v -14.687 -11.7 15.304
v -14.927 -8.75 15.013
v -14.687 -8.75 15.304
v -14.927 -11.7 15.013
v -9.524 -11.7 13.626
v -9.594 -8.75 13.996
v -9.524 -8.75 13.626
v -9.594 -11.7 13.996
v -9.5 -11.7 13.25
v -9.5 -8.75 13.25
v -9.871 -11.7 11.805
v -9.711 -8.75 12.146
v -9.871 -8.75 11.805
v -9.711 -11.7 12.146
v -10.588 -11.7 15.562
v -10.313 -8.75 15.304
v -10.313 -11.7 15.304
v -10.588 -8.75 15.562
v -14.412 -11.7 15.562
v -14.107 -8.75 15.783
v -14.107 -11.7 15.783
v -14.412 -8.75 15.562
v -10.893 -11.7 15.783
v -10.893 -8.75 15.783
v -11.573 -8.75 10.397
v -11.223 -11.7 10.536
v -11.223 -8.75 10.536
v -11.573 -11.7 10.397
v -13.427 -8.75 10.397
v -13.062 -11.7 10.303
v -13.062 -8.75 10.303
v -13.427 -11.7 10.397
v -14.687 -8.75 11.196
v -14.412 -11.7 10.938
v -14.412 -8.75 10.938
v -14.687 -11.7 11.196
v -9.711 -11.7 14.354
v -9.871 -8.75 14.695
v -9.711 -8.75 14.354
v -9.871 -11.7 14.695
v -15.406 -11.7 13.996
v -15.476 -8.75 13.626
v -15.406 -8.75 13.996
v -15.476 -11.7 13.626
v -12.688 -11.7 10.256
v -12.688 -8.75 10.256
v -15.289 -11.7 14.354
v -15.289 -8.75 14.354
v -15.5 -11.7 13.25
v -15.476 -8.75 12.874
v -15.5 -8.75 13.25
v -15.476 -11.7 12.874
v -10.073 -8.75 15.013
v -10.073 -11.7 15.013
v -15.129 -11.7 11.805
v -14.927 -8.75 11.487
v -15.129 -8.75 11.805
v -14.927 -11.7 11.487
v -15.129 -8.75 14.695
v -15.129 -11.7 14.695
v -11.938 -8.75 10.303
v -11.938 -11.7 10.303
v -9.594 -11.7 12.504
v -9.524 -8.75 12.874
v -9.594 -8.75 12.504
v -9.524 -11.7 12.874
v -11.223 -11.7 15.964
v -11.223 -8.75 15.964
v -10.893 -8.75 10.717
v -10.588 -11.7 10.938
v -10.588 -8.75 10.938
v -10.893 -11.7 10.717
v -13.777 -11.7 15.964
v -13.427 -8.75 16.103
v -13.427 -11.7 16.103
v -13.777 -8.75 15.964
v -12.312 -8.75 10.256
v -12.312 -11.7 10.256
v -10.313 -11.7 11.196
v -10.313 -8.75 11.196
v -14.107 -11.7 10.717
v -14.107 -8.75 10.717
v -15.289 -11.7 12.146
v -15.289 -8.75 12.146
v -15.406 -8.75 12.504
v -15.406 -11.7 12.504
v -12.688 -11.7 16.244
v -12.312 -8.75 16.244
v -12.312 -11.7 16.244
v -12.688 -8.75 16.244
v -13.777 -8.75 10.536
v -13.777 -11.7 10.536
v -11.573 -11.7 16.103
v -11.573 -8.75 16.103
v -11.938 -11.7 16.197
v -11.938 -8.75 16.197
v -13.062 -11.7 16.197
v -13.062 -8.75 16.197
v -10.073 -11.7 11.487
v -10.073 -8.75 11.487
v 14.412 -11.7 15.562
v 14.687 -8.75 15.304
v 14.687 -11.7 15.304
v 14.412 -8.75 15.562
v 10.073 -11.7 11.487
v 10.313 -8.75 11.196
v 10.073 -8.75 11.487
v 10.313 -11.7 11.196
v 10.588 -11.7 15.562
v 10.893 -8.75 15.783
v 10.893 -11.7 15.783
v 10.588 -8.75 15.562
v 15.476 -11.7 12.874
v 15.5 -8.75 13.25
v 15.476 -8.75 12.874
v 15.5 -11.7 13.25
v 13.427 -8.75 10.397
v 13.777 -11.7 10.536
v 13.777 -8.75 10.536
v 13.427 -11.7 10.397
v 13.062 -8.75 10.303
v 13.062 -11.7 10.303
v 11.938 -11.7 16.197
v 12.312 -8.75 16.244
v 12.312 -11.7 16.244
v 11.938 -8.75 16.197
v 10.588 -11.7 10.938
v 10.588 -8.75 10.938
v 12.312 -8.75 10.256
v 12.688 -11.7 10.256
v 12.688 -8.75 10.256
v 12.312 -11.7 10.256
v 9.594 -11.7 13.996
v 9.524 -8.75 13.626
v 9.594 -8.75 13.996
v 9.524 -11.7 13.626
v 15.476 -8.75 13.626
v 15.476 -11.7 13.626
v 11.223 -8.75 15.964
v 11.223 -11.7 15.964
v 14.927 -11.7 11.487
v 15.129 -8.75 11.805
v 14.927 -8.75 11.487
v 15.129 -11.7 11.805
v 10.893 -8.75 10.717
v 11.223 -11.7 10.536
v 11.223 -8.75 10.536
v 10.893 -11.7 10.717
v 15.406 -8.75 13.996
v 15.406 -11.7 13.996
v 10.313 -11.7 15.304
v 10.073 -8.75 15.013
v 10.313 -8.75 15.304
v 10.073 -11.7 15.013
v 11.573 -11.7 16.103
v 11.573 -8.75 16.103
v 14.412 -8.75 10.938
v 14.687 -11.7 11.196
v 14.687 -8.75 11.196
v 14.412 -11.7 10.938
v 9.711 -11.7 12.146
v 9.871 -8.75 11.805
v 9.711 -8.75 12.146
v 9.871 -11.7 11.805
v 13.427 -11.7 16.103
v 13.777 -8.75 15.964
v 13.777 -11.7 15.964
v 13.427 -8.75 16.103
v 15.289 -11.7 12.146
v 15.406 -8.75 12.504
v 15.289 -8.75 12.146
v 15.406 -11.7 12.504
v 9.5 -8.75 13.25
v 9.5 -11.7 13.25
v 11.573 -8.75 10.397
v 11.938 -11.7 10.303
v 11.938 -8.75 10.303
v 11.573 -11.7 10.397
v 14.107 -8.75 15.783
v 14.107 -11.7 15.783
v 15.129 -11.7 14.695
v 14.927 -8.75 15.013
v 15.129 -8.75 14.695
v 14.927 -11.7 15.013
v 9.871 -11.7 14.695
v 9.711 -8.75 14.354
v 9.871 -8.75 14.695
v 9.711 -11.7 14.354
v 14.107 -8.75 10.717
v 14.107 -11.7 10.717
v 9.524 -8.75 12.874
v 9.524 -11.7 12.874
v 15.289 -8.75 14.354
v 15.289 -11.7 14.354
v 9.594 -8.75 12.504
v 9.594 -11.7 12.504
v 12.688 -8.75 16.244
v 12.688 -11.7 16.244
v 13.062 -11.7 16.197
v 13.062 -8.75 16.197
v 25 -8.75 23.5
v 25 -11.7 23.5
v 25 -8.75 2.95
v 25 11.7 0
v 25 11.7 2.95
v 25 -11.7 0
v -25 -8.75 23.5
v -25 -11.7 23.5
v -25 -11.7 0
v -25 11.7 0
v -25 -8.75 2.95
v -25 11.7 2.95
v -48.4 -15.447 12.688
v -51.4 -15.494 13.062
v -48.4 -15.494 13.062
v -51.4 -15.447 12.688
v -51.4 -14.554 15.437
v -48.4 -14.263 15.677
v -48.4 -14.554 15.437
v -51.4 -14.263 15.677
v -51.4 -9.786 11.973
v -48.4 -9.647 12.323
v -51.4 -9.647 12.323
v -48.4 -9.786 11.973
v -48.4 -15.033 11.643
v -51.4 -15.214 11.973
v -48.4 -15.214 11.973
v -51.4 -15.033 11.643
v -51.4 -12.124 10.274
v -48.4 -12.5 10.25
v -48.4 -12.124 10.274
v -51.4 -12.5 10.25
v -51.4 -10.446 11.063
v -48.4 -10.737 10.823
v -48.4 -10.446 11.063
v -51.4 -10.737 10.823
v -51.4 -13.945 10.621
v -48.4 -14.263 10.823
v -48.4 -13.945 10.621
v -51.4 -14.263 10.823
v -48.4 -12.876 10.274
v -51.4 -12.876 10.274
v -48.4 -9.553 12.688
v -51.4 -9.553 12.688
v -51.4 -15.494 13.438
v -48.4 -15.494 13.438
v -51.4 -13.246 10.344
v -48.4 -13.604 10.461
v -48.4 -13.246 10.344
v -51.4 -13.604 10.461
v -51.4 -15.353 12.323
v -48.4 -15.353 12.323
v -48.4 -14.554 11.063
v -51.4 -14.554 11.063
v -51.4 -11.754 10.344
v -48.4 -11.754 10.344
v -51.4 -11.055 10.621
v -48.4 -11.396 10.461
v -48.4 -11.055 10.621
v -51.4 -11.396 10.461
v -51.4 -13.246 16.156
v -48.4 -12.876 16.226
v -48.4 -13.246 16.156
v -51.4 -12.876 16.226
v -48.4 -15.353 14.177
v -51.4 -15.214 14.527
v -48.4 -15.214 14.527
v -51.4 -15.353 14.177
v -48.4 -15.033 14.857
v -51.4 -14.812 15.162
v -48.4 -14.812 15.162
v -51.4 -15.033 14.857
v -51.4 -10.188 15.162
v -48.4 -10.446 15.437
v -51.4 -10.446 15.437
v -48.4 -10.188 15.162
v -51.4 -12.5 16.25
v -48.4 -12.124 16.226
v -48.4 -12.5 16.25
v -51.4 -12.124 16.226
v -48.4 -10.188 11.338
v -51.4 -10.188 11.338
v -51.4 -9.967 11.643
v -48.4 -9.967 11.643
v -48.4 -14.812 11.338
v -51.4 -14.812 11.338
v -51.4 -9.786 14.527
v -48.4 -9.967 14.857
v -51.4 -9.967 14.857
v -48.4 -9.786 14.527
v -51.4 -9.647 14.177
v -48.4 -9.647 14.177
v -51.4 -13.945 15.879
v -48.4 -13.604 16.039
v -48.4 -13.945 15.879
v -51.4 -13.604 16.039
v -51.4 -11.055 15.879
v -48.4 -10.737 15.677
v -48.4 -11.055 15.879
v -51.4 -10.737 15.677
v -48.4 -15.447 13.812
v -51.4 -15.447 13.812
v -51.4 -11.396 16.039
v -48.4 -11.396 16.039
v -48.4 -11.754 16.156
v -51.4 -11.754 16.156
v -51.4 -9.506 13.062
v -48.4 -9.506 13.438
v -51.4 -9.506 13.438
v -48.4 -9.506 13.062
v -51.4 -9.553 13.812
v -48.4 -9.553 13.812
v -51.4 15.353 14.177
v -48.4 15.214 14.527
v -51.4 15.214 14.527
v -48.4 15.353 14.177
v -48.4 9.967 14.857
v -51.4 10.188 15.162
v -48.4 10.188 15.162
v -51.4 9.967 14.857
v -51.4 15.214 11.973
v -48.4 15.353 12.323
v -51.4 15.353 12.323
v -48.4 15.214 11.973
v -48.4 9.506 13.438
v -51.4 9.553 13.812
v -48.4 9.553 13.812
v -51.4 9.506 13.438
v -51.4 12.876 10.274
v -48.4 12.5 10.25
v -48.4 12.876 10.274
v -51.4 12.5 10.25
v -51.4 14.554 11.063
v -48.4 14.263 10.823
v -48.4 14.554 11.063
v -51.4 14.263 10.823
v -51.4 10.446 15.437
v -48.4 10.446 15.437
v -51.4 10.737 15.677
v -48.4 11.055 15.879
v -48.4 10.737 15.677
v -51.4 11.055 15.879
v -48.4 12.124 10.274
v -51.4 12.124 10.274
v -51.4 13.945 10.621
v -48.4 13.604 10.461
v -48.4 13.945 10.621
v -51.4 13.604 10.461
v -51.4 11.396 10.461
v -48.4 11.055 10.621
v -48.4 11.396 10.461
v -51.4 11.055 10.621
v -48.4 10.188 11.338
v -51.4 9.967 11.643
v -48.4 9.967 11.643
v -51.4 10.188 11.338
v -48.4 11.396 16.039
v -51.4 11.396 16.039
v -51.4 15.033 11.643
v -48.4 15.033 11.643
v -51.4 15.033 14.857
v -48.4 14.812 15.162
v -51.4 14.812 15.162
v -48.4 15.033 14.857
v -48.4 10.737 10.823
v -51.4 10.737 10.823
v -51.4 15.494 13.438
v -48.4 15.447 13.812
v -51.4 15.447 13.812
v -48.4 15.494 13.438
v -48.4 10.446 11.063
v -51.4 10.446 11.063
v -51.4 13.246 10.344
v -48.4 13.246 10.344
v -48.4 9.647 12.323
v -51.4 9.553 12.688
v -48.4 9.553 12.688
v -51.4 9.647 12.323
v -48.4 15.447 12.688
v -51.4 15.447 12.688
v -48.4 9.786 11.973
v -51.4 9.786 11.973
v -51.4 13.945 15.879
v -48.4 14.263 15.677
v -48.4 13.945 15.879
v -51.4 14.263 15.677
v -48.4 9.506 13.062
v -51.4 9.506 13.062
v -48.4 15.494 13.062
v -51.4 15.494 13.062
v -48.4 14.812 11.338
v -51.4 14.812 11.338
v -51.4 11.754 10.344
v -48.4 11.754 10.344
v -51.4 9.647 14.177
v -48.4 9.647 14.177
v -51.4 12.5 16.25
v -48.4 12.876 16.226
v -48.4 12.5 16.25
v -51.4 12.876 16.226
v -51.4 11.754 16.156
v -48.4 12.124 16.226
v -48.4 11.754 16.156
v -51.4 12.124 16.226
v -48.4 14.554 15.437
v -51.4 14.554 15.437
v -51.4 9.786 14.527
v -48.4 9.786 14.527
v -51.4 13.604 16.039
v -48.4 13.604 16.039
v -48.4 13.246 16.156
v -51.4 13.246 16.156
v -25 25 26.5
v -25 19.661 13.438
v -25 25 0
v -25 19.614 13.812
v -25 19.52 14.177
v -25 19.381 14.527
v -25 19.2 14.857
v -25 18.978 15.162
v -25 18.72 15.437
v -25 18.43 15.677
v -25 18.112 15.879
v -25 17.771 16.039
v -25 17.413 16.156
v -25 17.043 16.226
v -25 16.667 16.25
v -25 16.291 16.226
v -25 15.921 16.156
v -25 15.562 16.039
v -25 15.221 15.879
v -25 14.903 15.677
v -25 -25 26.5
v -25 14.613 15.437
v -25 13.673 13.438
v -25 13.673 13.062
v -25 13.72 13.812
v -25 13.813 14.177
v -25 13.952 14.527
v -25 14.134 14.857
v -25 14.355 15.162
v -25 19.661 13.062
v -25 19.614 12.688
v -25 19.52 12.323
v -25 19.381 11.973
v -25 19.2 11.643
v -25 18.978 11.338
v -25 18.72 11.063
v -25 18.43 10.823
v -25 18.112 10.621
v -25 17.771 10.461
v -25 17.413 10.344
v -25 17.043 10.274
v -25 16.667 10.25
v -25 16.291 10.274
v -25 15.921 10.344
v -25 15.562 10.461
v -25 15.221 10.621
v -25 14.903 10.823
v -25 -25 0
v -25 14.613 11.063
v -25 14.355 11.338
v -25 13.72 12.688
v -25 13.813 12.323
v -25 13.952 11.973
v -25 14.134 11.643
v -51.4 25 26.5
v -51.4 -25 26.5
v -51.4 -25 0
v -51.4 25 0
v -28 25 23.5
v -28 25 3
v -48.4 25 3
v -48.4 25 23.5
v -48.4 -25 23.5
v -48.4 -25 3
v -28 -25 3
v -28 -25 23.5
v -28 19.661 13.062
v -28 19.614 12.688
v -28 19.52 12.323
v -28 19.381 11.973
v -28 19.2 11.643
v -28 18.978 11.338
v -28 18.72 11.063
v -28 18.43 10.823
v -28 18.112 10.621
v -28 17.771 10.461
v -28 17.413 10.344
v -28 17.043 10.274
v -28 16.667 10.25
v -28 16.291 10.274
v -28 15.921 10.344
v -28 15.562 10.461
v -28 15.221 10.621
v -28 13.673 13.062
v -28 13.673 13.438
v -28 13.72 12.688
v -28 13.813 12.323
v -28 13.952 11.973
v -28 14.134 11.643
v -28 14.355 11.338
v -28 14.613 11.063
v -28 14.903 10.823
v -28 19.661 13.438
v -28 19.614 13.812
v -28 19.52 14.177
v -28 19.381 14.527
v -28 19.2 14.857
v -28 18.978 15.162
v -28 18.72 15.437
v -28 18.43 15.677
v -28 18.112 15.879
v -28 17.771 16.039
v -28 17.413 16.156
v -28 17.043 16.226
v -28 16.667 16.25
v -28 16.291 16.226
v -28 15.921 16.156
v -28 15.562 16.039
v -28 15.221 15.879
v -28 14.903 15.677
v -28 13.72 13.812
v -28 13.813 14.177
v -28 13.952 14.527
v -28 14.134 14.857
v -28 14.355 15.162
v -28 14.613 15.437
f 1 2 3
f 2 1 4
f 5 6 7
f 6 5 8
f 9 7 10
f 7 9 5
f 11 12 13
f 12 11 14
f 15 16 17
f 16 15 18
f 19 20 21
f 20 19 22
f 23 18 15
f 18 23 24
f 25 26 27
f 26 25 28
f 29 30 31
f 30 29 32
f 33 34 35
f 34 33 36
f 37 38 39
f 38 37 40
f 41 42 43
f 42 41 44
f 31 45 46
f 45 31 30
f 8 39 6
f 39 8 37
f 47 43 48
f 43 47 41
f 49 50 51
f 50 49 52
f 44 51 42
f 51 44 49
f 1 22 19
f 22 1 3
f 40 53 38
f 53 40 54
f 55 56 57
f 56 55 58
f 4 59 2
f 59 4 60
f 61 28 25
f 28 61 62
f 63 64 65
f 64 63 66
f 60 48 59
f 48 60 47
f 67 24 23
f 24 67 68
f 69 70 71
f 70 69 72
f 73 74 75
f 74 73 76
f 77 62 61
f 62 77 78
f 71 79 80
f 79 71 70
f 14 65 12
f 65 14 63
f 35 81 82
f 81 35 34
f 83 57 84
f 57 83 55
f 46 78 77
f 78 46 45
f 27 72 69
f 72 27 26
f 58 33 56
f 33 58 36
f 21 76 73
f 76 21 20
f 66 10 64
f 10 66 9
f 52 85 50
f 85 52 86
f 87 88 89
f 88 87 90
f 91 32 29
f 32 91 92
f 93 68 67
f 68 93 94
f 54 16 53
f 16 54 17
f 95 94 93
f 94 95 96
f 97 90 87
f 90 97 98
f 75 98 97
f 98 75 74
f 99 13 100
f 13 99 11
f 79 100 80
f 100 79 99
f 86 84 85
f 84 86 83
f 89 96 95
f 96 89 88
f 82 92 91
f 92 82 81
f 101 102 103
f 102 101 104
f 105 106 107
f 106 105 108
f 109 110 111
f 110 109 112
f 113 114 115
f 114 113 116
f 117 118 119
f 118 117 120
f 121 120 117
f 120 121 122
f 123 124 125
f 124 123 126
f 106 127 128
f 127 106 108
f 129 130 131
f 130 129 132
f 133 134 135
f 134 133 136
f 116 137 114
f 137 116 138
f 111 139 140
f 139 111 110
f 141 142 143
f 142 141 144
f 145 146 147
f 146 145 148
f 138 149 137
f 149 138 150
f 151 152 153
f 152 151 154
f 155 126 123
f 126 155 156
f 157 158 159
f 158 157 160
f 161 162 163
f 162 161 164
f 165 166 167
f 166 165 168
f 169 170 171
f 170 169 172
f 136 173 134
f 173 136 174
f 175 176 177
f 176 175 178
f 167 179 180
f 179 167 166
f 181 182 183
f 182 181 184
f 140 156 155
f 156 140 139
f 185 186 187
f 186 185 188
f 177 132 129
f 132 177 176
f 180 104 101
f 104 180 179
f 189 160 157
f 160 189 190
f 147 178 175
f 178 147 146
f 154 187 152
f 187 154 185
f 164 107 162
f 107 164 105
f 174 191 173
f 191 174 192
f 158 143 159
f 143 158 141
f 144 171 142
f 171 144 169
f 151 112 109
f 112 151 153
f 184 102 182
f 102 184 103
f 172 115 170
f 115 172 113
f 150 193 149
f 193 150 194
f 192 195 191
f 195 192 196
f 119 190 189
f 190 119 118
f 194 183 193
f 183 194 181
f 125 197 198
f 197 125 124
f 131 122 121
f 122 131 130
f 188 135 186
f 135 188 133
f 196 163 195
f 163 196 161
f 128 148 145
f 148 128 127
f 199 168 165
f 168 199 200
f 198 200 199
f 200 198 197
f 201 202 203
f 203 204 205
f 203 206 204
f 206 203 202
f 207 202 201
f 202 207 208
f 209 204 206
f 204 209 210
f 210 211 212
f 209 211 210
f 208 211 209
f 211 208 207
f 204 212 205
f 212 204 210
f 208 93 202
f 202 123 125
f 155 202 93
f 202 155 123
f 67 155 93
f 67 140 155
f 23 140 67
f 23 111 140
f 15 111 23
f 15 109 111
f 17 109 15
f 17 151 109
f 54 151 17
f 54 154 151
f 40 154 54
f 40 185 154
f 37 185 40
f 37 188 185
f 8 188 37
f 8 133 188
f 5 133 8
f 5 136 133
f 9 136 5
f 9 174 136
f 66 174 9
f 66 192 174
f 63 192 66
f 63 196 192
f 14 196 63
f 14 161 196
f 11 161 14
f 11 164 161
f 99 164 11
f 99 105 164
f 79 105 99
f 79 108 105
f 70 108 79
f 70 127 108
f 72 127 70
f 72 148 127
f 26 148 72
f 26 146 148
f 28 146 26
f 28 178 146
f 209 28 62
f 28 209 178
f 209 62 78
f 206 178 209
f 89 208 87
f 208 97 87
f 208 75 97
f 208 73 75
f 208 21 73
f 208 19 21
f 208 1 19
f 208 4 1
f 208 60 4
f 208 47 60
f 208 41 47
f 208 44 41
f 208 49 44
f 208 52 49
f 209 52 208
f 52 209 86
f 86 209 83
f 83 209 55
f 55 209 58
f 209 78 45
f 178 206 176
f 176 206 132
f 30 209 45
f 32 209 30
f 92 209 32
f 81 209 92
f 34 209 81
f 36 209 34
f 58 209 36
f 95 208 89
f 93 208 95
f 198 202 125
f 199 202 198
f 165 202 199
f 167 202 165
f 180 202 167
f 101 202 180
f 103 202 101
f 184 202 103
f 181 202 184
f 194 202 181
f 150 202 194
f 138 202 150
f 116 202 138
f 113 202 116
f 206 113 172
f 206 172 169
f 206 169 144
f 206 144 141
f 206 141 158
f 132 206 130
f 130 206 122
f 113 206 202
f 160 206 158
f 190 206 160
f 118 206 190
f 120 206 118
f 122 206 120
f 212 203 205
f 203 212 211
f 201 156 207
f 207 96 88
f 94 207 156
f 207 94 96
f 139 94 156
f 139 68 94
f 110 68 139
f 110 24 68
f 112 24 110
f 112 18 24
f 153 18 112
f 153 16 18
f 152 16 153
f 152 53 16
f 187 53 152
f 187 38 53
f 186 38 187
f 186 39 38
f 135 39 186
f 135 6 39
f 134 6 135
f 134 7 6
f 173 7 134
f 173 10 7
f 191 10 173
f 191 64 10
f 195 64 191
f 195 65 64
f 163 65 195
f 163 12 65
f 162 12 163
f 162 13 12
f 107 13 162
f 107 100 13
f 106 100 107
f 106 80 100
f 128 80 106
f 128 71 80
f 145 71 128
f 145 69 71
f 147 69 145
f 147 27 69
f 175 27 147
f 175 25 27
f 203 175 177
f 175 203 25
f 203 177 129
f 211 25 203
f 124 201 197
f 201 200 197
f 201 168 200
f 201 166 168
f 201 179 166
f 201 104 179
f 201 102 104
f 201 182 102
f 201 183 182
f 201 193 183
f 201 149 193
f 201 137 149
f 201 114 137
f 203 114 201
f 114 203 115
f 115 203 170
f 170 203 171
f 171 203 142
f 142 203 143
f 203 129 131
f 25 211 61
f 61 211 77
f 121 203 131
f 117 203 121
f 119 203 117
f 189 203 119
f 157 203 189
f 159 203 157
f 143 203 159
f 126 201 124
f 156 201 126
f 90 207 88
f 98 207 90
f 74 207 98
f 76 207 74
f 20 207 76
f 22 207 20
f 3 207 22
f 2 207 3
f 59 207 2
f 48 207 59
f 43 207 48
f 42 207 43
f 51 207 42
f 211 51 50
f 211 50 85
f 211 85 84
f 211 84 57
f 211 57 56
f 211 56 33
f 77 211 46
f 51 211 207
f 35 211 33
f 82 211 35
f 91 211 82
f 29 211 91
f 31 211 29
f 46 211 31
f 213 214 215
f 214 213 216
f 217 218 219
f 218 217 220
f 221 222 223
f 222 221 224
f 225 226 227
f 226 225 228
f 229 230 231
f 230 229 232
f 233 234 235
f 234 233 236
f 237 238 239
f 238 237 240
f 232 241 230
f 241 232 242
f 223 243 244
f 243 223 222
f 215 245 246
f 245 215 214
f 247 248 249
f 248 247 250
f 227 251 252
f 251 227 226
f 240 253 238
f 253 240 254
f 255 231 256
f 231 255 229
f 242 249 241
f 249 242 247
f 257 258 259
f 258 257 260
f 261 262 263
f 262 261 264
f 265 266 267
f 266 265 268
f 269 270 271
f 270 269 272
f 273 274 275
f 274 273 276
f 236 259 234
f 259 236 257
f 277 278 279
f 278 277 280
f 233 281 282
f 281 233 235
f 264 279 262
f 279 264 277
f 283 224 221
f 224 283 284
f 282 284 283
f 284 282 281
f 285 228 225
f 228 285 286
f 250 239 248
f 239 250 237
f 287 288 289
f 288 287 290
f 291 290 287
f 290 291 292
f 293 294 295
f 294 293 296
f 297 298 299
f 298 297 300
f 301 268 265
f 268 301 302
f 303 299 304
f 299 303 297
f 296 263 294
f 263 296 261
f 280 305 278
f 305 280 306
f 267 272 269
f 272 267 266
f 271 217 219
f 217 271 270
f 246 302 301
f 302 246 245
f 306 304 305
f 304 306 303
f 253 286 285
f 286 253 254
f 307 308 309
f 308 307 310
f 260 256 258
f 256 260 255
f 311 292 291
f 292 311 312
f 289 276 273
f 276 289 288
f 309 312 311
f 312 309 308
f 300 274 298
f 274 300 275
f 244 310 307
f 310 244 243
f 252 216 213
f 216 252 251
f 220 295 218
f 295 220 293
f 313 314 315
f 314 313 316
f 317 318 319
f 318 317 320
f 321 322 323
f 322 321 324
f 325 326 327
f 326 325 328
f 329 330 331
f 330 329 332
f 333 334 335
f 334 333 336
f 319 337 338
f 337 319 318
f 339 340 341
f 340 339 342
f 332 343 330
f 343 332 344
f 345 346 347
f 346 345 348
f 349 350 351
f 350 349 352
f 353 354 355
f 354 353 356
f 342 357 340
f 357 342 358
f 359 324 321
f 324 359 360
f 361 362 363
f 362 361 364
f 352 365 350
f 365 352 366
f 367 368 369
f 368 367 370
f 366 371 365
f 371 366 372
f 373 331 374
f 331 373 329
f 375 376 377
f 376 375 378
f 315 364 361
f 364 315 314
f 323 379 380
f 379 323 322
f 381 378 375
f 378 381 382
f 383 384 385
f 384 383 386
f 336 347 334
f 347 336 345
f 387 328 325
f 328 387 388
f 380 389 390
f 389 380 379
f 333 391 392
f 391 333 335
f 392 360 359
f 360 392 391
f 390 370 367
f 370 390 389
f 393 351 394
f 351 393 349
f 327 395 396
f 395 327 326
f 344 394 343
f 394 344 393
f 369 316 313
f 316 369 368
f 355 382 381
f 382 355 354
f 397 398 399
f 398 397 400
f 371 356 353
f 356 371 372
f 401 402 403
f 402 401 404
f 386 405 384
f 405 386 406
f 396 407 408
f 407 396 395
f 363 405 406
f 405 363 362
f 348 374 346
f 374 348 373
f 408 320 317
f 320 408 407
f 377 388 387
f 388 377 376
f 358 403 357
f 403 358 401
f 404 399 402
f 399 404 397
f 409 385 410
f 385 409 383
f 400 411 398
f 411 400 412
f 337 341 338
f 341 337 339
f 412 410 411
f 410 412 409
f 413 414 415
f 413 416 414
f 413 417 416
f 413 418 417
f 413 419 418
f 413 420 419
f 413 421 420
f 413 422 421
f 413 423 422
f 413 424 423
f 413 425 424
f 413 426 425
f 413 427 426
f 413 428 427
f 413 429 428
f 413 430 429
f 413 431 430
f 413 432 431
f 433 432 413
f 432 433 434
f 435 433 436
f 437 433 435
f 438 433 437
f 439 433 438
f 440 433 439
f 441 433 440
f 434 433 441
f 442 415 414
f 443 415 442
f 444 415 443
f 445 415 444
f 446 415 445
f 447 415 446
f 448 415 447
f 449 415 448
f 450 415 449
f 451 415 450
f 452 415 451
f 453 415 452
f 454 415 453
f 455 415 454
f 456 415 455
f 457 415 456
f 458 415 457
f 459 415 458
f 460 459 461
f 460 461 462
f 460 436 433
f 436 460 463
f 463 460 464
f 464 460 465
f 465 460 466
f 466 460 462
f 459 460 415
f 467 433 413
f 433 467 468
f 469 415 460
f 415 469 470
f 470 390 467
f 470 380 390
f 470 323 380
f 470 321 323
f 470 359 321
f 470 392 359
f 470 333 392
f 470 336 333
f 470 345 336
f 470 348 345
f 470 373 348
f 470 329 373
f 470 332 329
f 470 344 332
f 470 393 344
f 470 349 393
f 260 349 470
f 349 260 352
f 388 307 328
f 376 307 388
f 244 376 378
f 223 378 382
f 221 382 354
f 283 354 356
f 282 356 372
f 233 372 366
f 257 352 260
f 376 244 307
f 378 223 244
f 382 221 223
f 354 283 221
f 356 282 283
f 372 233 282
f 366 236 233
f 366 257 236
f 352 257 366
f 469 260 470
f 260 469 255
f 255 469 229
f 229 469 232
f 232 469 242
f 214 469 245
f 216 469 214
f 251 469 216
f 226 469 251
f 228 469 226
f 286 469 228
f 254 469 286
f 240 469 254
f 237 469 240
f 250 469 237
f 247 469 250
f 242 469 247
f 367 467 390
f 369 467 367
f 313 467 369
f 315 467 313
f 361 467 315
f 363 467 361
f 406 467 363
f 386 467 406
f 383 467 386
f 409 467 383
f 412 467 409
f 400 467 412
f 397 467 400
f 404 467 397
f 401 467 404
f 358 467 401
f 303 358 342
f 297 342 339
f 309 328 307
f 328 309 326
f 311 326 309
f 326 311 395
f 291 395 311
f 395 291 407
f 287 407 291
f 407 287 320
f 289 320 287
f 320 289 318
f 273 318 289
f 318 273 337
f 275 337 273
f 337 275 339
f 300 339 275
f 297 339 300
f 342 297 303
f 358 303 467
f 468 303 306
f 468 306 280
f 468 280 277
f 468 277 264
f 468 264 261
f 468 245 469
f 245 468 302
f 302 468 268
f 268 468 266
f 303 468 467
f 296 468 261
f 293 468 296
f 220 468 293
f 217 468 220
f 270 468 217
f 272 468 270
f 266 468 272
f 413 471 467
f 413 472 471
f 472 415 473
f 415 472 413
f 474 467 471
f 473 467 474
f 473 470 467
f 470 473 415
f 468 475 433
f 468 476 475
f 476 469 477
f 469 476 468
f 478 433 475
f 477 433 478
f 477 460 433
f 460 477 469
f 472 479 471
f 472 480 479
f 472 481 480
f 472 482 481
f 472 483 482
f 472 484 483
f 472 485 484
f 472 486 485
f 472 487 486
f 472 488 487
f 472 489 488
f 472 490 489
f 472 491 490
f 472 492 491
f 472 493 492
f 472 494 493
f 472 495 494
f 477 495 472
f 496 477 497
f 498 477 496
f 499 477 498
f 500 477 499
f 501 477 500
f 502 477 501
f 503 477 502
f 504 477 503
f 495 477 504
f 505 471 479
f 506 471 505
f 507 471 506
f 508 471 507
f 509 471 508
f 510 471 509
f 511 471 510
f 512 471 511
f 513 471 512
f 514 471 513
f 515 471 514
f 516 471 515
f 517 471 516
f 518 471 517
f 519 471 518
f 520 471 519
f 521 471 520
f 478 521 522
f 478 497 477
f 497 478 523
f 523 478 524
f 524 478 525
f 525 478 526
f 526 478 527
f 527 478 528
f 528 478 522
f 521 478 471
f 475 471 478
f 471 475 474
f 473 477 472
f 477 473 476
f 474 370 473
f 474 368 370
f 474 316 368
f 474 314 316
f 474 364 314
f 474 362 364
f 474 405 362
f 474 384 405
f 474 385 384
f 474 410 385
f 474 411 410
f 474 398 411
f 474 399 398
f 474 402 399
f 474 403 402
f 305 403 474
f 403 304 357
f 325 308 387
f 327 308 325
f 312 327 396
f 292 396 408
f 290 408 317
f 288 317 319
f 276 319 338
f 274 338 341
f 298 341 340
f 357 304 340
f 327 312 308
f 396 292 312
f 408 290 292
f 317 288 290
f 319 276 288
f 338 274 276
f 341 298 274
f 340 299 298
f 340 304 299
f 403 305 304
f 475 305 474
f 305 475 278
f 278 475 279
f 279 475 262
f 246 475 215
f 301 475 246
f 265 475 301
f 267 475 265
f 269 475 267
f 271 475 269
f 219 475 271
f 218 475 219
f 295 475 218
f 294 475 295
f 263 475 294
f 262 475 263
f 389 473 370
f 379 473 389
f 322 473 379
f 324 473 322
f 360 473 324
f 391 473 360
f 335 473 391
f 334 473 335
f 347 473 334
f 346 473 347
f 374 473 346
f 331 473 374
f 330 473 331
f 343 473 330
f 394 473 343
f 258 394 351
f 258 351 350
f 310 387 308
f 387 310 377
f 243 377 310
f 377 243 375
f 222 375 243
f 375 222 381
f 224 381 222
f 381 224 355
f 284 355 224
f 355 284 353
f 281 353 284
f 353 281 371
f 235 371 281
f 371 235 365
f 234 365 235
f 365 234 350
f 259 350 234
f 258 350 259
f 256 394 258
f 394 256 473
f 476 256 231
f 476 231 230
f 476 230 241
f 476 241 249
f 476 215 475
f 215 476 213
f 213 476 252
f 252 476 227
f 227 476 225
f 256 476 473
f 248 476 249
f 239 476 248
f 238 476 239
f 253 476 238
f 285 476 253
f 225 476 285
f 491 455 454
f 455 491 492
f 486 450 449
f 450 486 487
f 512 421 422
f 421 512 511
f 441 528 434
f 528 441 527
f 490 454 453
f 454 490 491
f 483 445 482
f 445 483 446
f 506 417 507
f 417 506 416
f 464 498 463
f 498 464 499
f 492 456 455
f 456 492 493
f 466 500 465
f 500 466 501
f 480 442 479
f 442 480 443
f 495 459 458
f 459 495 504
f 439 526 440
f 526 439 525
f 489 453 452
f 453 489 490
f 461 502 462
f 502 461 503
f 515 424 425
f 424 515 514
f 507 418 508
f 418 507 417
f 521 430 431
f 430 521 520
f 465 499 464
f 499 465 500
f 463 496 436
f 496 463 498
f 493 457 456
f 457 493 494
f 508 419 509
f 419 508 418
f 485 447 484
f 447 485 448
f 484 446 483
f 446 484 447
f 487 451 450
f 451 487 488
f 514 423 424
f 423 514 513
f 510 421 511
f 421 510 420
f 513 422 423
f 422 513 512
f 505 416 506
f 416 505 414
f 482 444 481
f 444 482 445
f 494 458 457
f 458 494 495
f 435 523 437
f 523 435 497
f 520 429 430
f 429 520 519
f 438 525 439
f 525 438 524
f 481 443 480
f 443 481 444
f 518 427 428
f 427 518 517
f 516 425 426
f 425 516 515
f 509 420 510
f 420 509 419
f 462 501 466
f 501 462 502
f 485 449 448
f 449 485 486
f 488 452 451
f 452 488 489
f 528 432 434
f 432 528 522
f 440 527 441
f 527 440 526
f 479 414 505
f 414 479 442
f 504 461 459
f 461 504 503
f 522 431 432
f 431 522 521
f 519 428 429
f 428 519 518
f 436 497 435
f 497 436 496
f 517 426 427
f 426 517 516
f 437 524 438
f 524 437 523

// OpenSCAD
$fn = 50;

dimh = 20.4;
dimv = 20.5;
len = 50;
wall = 3;

m5rad = 3;

junction();
*translate([5, dimh+10, 0]) mirror() junction();

module junction() {
	union() {
		p1();
		translate([-len/2-dimh/2-wall, 0, 0])
			p2();
	}
}

module p1() {
	translate([0, 0, (dimv+wall)/2])
	difference() {
		cube([len, dimh+wall, dimv+wall], true);
		translate([0, wall/2, wall/2])
			cube([len+1, dimh+0.1, dimv+0.1], true);
		for (i=[-1, 1])
			translate([i*len/4, 0, wall/2])
				rotate([90, 0, 0])
					cylinder(r=m5rad, h=dimh*2, center=true);
	}
}

module p2() {
	translate([0, 0, (dimv+wall*2)/2])
	difference() {
		cube([dimh+wall*2, len, dimv+wall*2], true);
		translate([0, 0, 0])
			cube([dimh, len+1, dimv], true);
		for (i=[-1, 1])
			translate([-dimh/2, i*len/4, 0])
				rotate([0, 90, 0])
					cylinder(r=m5rad, h=dimh, center=true);
		translate([dimh/2, len/3, 0])
			rotate([0, 90, 0])
				cylinder(r=m5rad, h=dimh, center=true);
	}
}
